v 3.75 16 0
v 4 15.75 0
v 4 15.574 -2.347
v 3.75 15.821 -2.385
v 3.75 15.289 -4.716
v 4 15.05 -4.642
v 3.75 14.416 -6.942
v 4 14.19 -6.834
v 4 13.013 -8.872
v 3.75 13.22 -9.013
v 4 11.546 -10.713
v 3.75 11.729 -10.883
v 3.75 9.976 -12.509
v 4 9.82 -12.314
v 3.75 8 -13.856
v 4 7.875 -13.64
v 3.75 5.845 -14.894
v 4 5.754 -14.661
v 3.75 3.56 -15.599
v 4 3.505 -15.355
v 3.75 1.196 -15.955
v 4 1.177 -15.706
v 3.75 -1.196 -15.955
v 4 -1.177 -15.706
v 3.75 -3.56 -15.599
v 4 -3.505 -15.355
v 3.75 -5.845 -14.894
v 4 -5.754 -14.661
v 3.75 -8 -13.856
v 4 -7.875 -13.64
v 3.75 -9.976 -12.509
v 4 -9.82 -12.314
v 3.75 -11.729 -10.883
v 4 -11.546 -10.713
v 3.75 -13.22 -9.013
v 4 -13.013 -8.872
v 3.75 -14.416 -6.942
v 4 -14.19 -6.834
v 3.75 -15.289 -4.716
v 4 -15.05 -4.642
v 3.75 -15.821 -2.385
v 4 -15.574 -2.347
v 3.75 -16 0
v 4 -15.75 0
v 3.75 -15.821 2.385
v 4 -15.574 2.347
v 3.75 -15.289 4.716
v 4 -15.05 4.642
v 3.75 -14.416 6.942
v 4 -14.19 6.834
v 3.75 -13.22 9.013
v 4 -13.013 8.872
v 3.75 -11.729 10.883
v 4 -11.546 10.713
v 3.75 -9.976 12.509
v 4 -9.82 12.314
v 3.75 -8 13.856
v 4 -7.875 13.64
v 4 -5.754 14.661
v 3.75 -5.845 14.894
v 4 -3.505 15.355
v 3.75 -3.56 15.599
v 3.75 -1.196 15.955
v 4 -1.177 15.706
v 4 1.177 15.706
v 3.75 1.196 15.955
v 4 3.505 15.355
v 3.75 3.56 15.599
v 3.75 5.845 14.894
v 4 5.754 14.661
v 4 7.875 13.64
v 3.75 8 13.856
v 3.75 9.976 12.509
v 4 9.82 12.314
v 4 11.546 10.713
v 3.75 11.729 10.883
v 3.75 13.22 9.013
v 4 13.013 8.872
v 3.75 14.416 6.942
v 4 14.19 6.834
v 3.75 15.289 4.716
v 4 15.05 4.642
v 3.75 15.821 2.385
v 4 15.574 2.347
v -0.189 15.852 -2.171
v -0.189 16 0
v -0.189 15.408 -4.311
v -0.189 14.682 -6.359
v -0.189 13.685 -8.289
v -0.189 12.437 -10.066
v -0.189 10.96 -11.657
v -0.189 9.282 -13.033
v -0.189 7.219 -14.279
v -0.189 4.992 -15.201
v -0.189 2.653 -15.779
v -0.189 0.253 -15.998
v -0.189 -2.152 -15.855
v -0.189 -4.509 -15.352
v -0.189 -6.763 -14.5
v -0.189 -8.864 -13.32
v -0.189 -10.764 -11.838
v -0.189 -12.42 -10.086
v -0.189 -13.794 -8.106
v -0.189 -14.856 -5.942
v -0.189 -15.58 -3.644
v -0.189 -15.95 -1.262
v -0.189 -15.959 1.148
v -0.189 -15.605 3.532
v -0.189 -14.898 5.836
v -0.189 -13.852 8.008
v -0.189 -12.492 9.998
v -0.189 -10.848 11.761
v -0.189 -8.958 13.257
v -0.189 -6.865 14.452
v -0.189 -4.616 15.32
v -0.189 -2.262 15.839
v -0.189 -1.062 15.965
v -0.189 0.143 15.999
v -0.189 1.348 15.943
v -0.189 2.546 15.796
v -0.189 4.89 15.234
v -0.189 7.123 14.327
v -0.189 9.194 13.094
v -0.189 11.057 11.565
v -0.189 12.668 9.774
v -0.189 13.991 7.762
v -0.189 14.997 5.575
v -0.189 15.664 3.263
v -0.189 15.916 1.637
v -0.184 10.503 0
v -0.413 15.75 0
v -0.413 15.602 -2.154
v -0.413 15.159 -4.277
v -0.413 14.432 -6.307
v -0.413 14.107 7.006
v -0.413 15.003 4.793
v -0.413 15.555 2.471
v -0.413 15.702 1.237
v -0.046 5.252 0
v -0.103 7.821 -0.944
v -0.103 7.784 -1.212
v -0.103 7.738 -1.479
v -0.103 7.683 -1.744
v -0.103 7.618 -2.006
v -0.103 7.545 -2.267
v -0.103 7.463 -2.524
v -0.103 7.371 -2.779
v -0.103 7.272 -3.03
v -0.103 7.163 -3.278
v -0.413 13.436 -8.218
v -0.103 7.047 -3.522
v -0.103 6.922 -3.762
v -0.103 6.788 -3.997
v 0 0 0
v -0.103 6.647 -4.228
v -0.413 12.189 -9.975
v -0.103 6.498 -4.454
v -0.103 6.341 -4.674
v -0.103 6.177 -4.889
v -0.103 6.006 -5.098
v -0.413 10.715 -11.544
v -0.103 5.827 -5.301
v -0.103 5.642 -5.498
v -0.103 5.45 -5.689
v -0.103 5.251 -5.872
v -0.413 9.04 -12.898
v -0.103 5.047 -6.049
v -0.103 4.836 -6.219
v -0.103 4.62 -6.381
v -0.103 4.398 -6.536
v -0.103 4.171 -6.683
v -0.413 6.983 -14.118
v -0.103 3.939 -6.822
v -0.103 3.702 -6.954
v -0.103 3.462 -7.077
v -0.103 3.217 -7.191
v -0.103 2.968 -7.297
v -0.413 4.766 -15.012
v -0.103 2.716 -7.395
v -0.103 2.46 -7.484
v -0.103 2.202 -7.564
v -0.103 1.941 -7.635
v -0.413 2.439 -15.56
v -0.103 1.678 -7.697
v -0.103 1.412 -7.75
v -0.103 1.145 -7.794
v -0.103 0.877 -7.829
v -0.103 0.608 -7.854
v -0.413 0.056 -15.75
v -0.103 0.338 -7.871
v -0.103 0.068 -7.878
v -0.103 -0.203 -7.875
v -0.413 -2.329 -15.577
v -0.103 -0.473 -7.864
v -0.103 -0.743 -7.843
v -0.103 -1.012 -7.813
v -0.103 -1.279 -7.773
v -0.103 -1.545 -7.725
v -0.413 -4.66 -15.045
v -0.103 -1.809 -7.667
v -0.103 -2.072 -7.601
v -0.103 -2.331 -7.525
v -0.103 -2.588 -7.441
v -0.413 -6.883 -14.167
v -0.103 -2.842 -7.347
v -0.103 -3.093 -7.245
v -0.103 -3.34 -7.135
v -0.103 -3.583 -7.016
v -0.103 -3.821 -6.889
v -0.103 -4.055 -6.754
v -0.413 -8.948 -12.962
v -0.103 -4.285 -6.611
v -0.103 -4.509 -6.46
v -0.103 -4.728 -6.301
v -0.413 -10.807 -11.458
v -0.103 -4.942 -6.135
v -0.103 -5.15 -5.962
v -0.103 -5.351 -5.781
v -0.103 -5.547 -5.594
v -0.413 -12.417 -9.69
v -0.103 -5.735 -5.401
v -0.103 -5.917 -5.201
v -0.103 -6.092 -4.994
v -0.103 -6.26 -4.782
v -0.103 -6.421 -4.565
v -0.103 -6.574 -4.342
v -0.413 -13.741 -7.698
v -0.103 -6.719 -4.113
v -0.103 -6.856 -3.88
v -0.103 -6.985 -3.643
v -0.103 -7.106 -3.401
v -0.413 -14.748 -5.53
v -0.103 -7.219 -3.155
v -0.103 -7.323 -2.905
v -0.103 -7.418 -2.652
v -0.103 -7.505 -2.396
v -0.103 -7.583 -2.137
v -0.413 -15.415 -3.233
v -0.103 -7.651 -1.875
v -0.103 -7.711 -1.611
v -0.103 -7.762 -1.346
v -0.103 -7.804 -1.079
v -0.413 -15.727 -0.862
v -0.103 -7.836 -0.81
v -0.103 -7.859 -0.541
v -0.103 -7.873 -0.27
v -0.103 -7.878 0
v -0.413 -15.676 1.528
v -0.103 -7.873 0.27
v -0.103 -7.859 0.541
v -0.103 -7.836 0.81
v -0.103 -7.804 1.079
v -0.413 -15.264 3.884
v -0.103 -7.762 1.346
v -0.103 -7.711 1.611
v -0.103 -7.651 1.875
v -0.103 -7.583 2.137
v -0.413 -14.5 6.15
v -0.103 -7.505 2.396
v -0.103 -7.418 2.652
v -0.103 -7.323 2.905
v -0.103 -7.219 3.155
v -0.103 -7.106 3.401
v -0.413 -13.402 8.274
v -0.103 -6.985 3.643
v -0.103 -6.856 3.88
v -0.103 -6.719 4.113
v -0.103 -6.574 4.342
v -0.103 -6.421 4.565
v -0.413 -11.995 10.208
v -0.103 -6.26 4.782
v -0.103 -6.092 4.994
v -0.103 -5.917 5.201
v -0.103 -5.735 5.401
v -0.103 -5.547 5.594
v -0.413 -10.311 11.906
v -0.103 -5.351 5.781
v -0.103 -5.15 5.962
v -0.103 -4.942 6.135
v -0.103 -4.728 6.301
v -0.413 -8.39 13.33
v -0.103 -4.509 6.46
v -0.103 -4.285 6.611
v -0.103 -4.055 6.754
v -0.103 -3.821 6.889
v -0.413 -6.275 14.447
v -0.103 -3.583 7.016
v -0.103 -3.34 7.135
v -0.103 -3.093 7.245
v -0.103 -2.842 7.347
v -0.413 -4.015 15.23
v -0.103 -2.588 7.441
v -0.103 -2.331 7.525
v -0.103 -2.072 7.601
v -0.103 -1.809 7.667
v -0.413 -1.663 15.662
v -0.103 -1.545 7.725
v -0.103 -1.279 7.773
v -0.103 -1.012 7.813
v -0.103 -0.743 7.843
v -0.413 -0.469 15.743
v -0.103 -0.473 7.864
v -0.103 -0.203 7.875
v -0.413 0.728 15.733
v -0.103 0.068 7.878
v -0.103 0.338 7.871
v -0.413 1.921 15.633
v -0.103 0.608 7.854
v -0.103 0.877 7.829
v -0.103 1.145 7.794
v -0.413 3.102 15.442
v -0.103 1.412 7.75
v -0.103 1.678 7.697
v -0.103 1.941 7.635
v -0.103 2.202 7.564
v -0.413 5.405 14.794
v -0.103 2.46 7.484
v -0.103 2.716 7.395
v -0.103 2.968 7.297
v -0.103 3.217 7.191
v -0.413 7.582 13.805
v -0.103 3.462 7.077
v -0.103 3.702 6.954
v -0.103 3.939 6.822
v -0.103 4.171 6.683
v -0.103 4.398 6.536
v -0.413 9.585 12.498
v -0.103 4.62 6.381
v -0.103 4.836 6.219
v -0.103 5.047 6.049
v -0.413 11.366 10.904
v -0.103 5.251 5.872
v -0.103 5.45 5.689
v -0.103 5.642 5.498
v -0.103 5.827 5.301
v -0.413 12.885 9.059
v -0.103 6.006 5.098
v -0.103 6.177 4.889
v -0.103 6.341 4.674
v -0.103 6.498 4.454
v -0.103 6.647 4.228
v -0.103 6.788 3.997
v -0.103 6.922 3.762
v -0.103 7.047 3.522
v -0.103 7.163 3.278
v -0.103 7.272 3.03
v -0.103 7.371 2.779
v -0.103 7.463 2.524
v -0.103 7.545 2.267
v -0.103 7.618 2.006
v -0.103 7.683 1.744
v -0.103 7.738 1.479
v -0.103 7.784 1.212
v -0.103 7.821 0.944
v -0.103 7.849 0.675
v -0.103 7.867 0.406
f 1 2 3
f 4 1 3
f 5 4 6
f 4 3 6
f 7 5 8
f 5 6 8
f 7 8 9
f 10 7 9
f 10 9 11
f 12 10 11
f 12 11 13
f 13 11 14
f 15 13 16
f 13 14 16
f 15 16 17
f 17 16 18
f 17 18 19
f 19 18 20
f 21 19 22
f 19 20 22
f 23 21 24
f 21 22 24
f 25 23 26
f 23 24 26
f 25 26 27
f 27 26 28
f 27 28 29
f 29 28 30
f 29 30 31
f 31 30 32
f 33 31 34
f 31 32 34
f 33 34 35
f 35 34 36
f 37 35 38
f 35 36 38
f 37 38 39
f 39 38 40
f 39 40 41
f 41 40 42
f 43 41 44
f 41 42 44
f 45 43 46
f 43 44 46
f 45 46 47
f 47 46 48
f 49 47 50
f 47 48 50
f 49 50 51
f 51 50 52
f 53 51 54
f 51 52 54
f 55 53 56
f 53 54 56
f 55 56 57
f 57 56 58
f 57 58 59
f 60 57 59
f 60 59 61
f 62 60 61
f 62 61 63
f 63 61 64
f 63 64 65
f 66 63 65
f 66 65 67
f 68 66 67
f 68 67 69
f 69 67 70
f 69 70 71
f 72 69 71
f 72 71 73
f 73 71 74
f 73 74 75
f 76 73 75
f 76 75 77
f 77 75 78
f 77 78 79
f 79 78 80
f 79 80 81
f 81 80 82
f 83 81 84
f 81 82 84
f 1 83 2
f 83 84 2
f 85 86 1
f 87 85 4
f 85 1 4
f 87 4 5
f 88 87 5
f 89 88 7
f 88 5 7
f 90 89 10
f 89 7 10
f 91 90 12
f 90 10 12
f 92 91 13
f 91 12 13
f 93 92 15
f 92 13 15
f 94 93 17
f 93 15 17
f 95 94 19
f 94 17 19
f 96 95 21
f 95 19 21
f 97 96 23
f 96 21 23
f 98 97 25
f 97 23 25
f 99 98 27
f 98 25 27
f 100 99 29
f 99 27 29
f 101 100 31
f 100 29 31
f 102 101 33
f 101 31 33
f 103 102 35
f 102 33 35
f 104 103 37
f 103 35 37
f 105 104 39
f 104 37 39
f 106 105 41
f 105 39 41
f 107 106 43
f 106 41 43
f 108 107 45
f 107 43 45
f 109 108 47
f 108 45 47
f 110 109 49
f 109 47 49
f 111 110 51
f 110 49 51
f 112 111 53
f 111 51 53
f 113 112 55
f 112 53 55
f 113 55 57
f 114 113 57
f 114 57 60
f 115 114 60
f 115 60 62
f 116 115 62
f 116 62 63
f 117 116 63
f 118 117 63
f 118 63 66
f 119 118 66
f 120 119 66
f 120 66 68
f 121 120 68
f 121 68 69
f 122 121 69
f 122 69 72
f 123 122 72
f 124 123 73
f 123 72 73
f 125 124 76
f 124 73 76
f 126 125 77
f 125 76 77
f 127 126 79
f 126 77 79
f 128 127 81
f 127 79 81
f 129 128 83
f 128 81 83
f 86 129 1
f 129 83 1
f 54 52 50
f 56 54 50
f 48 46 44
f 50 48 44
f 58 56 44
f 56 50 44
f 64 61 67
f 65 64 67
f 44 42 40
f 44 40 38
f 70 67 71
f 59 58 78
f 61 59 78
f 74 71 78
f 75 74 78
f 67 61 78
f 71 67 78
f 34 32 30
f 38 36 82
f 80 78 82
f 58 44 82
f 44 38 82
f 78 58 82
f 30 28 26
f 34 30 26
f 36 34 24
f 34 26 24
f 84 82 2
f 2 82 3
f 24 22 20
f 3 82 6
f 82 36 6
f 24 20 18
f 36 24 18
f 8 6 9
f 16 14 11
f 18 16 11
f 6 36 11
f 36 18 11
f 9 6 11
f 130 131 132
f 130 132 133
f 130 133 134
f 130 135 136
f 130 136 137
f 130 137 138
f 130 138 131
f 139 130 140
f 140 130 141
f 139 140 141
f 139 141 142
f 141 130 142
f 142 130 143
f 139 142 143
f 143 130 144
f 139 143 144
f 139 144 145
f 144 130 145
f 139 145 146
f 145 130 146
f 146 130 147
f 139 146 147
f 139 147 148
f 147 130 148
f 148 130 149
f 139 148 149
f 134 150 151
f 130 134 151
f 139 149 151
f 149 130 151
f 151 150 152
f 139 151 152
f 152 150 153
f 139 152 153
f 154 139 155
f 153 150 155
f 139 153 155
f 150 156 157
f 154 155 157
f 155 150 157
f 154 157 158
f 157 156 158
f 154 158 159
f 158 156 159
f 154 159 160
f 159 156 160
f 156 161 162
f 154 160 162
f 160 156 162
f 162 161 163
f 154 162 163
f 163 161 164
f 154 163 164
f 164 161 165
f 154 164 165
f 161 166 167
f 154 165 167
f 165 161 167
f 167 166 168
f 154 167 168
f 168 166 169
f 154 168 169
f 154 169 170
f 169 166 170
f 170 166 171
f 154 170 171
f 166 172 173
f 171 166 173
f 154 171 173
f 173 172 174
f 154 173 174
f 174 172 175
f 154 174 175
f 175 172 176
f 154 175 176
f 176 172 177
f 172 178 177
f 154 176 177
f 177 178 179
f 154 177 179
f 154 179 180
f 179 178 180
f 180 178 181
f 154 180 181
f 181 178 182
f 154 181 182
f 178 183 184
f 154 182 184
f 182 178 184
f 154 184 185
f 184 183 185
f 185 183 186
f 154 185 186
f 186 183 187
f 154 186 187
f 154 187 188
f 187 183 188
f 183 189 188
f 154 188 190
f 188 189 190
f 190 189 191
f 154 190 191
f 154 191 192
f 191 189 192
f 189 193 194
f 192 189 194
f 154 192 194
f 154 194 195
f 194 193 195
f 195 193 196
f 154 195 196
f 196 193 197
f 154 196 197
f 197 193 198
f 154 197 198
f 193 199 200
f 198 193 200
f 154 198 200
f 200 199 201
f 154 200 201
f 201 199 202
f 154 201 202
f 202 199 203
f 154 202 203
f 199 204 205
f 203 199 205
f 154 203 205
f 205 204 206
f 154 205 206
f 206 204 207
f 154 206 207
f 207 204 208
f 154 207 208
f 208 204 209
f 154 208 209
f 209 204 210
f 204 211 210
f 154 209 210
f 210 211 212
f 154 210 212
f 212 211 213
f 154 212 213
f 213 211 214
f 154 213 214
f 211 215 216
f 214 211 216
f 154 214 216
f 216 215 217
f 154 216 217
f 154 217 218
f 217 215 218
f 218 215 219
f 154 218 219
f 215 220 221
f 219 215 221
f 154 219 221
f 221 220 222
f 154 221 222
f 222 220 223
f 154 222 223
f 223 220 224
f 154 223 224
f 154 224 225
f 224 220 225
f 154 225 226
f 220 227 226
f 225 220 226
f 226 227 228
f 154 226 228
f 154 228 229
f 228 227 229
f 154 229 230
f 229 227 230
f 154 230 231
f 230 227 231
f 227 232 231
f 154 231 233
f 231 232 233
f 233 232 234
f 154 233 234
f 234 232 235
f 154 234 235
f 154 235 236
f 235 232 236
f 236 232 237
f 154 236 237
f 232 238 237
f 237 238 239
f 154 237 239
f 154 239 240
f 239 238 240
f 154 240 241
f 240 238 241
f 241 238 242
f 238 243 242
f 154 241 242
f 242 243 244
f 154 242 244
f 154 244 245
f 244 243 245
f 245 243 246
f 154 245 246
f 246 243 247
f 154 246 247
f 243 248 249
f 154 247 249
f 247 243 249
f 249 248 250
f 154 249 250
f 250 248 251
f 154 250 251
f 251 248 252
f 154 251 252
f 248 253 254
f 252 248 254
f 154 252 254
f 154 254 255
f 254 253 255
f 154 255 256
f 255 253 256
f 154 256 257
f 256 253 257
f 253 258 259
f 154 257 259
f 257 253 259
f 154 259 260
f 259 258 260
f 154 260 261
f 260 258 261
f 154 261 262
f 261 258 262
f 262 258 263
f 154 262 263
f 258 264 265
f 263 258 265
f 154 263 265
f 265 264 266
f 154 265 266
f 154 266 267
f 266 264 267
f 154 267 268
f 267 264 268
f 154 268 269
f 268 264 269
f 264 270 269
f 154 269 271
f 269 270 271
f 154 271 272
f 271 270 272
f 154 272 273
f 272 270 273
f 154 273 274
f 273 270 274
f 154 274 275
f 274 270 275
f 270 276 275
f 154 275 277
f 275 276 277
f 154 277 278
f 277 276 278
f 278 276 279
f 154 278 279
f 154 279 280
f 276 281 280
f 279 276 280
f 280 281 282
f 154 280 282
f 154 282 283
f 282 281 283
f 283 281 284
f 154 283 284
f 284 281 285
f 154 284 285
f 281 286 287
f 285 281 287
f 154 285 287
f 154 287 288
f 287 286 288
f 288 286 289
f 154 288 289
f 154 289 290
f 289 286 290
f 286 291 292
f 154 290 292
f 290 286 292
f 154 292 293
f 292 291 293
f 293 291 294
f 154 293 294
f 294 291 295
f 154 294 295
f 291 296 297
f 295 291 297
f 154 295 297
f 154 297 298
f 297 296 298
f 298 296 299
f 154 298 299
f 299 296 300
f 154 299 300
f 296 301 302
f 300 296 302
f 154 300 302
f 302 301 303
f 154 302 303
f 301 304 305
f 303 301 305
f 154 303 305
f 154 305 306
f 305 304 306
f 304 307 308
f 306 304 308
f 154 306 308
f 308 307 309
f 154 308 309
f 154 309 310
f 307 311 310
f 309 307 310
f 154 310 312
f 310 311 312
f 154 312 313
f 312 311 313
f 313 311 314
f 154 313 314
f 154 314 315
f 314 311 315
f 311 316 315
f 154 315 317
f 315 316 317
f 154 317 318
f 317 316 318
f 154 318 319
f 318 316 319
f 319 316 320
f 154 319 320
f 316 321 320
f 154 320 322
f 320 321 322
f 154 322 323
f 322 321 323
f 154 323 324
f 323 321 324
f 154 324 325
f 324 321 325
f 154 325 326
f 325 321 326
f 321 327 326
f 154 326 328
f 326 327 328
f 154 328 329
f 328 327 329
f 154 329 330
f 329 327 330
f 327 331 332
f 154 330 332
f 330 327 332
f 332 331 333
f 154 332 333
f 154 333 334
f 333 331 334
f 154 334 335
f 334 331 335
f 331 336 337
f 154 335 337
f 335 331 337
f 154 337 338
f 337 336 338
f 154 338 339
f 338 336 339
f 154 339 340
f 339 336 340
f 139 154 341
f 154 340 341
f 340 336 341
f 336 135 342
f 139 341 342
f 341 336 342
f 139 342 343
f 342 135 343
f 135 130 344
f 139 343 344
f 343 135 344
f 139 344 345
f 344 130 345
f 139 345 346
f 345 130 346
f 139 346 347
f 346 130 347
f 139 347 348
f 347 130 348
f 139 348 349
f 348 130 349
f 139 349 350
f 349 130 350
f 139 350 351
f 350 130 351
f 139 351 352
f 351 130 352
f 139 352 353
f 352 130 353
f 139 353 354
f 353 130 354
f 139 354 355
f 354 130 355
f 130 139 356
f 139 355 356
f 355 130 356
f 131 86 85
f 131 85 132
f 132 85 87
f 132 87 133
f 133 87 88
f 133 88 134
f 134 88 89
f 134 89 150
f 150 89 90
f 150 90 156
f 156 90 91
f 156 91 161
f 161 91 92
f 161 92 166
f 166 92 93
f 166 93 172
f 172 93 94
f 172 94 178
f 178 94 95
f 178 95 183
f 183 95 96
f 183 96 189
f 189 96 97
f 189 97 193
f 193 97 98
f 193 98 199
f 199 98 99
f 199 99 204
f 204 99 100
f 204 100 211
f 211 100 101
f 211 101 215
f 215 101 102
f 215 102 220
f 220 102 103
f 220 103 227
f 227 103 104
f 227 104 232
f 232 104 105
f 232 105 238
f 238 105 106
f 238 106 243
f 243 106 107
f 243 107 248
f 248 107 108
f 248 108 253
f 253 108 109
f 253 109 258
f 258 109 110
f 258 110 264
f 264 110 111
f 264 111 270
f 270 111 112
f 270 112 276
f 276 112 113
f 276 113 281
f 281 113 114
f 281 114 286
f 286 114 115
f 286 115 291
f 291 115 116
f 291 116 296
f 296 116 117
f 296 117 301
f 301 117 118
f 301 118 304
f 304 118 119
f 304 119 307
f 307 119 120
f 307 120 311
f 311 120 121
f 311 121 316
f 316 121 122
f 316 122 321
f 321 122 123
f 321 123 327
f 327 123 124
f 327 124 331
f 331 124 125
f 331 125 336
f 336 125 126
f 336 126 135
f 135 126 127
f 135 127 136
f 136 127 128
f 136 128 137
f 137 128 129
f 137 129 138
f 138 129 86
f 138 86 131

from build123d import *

# Parameters (mm, degrees)
CHAMFER_1_SIZE2       = 0.25
CHAMFER_1_SIZE        = 0.237681877
CHAMFER_1_EDGE_2_SIZE = 0.25


with BuildPart() as part:
    # Эскиз1 → Повернуть1 (revolve)
    with BuildSketch(Plane.XY):
        with BuildLine():
            Line((-0.426259063, 16), (4, 16))
            Line((4, 16), (4, 0))
            Line((4, 0), (0, 0))
            ThreePointArc((0, 0), (-0.106583668, 8.002838509), (-0.426259063, 16))
        make_face()
    revolve(axis=Axis((4, 0, 0), (-1, 0, 0)))

    # Фаска1
    chamfer_1_edges = [part.edges().sort_by_distance(p)[0] for p in [
        (-0.426259063, -16, 0),
    ]]
    chamfer(chamfer_1_edges, length=CHAMFER_1_SIZE, length2=CHAMFER_1_SIZE2)

    # Фаска1 edge 2
    chamfer_1_edge_2_edges = [part.edges().sort_by_distance(p)[0] for p in [
        (4, -16, 0),
    ]]
    chamfer(chamfer_1_edge_2_edges, length=CHAMFER_1_EDGE_2_SIZE)


solid = part.part
